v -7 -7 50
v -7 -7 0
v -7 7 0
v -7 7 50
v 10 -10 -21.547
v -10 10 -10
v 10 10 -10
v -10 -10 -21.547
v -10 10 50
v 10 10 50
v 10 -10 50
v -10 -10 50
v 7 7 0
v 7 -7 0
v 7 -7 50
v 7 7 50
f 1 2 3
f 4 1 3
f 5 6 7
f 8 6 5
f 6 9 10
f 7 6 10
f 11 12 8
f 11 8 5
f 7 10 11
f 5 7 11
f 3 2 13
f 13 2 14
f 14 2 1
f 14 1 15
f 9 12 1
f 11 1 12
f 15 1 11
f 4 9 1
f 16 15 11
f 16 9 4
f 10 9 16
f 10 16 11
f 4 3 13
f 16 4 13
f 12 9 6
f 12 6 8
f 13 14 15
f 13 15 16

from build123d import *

# Parameters (mm, degrees)
SKETCH_W     = 20
SKETCH_H     = 20
SKETCH_W_2   = 14
SKETCH_H_2   = 14
PAD_DEPTH    = 50
SKETCH002_W  = 20
SKETCH002_H  = 20
PAD001_DEPTH = 30
POCKET_DEPTH = 20.001


with BuildPart() as part:
    # Sketch → Pad (new body)
    with BuildSketch(Plane.XY):
        Rectangle(SKETCH_W, SKETCH_H)
        Rectangle(SKETCH_W_2, SKETCH_H_2, mode=Mode.SUBTRACT)
    extrude(amount=PAD_DEPTH)

    # Sketch002 (on Face9 of Pad) → Pad001 (join)
    with BuildSketch(Plane(origin=(0, 0, 0), x_dir=(1, 0, 0), z_dir=(0, 0, -1))):
        Rectangle(SKETCH002_W, SKETCH002_H)
    extrude(amount=PAD001_DEPTH)

    # Sketch003 (on Face7 of Pad001) → Pocket (cut, through all)
    with BuildSketch(Plane(origin=(-10, 0, 0), x_dir=(0, -1, 0), z_dir=(-1, 0, 0))):
        Polygon((-10, -10), (10, -21.547005), (10, -30), (-10, -30), align=None)
    extrude(amount=-POCKET_DEPTH, mode=Mode.SUBTRACT)


solid = part.part
